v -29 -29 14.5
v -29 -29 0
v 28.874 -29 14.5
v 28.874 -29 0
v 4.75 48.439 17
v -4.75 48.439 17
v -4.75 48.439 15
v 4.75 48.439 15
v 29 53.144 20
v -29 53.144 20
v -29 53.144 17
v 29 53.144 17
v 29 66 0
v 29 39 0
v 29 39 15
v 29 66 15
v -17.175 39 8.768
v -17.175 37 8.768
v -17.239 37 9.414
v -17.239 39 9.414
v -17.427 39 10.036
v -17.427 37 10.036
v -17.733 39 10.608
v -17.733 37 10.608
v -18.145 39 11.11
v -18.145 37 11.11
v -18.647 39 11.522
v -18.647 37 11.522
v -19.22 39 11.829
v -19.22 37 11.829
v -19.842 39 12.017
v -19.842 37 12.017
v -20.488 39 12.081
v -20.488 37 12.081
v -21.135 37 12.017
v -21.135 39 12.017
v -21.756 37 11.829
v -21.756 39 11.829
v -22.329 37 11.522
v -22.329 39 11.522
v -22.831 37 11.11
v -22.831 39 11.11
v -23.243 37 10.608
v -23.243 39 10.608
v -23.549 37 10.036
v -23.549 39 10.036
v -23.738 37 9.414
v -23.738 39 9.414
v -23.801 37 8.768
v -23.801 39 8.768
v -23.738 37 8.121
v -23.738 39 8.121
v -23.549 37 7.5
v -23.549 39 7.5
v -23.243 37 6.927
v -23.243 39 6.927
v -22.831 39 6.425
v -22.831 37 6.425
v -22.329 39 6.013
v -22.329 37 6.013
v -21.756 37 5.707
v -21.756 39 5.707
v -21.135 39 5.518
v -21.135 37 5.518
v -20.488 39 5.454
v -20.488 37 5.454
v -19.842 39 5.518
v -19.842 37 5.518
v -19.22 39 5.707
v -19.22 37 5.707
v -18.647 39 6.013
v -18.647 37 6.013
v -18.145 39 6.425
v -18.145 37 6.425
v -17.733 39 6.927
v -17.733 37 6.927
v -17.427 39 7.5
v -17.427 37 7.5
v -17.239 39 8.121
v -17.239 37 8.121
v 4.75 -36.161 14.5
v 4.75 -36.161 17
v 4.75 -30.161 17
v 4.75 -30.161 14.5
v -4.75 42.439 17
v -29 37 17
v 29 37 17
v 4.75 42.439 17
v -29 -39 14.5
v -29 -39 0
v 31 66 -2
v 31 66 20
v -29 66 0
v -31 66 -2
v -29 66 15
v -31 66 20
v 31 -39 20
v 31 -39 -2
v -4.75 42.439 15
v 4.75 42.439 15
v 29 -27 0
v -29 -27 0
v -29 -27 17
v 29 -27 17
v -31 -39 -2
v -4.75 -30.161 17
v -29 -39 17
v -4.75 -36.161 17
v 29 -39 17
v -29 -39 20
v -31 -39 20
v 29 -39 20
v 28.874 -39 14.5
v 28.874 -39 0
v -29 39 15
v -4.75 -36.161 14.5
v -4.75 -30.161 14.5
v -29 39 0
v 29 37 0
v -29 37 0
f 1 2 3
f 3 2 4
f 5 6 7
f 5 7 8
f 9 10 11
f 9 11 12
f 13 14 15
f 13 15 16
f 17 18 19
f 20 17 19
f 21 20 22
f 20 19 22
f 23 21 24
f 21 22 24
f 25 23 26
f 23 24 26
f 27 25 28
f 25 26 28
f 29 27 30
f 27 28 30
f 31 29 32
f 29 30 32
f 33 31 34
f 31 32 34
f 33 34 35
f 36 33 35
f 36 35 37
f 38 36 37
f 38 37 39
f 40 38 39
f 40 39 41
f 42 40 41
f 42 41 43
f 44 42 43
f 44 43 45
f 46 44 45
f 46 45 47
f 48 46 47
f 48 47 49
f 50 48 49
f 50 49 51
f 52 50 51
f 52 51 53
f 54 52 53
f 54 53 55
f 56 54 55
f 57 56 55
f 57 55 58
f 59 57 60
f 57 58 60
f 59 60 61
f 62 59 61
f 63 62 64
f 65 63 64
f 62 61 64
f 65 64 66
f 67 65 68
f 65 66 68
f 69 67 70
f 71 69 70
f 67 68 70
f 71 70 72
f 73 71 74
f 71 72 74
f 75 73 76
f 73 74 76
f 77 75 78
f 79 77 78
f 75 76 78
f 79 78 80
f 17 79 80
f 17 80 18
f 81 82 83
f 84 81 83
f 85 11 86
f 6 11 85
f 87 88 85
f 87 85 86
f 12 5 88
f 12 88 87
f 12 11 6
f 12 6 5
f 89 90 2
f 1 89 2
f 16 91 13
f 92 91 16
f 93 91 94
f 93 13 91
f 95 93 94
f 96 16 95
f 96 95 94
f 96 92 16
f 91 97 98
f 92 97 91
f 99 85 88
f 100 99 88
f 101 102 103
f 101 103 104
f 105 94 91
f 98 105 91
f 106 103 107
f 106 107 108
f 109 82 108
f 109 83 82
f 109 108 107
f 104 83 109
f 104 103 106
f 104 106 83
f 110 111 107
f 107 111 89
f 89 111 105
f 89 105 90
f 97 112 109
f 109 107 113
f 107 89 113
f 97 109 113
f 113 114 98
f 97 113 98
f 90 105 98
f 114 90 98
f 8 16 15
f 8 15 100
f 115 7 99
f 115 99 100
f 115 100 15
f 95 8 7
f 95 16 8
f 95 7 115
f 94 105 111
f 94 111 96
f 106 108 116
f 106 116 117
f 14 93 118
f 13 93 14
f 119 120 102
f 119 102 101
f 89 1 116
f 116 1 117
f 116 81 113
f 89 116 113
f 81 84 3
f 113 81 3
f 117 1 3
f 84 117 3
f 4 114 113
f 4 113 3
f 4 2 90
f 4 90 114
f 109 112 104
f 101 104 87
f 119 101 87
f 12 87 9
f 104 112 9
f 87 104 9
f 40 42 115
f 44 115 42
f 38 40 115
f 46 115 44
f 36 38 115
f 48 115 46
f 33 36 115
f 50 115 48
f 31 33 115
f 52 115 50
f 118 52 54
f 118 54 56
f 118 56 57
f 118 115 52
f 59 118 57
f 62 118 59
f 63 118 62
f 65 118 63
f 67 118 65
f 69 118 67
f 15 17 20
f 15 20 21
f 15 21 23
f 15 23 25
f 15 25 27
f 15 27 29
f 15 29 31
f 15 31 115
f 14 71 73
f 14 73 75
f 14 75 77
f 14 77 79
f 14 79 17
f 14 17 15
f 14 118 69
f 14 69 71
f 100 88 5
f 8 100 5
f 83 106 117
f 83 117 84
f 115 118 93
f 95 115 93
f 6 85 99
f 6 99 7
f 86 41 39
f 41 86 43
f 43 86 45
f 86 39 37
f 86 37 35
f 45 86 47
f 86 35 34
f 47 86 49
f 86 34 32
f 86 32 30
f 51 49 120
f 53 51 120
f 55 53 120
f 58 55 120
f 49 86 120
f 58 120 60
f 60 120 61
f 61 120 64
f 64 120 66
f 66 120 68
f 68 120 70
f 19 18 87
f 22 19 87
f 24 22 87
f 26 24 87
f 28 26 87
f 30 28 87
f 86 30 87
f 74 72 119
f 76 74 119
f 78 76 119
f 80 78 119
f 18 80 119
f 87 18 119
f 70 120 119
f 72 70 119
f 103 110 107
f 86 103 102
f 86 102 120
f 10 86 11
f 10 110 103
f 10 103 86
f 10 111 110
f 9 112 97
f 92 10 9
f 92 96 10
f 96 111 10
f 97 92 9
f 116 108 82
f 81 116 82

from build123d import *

# Parameters (mm, degrees)
SKETCH1_W           = 62
SKETCH1_H           = 78
BOSS_EXTRUDE1_DEPTH = 2
SKETCH2_W           = 62
SKETCH2_H           = 78
SKETCH2_W_2         = 58
SKETCH2_H_2         = 64
BOSS_EXTRUDE2_DEPTH = 20
CUT_EXTRUDE1_REACH  = 86.481
SKETCH3_R           = 3.313142946
SKETCH4_W           = 62
SKETCH4_H           = 27
BOSS_EXTRUDE3_DEPTH = 2
SKETCH5_W           = 2
SKETCH5_H           = 27
BOSS_EXTRUDE4_DEPTH = 20
SKETCH6_W           = 58
SKETCH6_H           = 27
BOSS_EXTRUDE5_DEPTH = 2
SKETCH9_W           = 57.873853322
SKETCH9_H           = 10
CUT_EXTRUDE4_DEPTH  = 14.5
SKETCH12_W          = 58
SKETCH12_H          = 27
BOSS_EXTRUDE6_DEPTH = 3
SKETCH13_W          = 58
SKETCH13_H          = 92.14389058
CUT_EXTRUDE6_DEPTH  = 3
CUT_EXTRUDE7_REACH  = 77.353
SKETCH14_W          = 9.5
SKETCH14_H          = 6


with BuildPart() as part:
    # Sketch1 → Boss-Extrude1 (new body)
    with BuildSketch(Plane.XY):
        Rectangle(SKETCH1_W, SKETCH1_H)
    extrude(amount=-BOSS_EXTRUDE1_DEPTH)

    # Sketch2 → Boss-Extrude2 (add)
    with BuildSketch(Plane.XY):
        Rectangle(SKETCH2_W, SKETCH2_H)
        with Locations((0, 5)):
            Rectangle(SKETCH2_W_2, SKETCH2_H_2, mode=Mode.SUBTRACT)
    extrude(amount=BOSS_EXTRUDE2_DEPTH)

    # Sketch3 → Cut-Extrude1 (cut, up to next)
    with BuildSketch(Plane.XZ.offset(-37), mode=Mode.PRIVATE) as cut_extrude1_sk1:
        with Locations((-20.488158498, 8.767623766)):
            Circle(SKETCH3_R)
    cut_extrude1_tool1 = extrude(cut_extrude1_sk1.sketch, amount=-CUT_EXTRUDE1_REACH, mode=Mode.PRIVATE) & part.part
    add(cut_extrude1_tool1.solids().sort_by_distance((-20.488158, 37, 8.767624))[0], mode=Mode.SUBTRACT)

    # Sketch4 → Boss-Extrude3 (add)
    with BuildSketch(Plane.XY):
        with Locations((0, 52.5)):
            Rectangle(SKETCH4_W, SKETCH4_H)
    extrude(amount=-BOSS_EXTRUDE3_DEPTH)

    # Sketch5 → Boss-Extrude4 (add)
    with BuildSketch(Plane.XY):
        with Locations((-30, 52.5)):
            Rectangle(SKETCH5_W, SKETCH5_H)
        with Locations((30, 52.5)):
            Rectangle(SKETCH5_W, SKETCH5_H)
    extrude(amount=BOSS_EXTRUDE4_DEPTH)

    # Sketch6 → Boss-Extrude5 (add)
    with BuildSketch(Plane.XY.offset(20)):
        with Locations((0, 52.5)):
            Rectangle(SKETCH6_W, SKETCH6_H)
    extrude(amount=-BOSS_EXTRUDE5_DEPTH)

    # Sketch9 → Cut-Extrude4 (cut)
    with BuildSketch(Plane.XY):
        with Locations((-0.063073339, -34)):
            Rectangle(SKETCH9_W, SKETCH9_H)
    extrude(amount=CUT_EXTRUDE4_DEPTH, mode=Mode.SUBTRACT)

    # Sketch12 → Boss-Extrude6 (add)
    with BuildSketch(Plane(origin=(0, 0, 18), x_dir=(-1, 0, 0), z_dir=(0, 0, -1))):
        with Locations((0, 52.5)):
            Rectangle(SKETCH12_W, SKETCH12_H)
    extrude(amount=BOSS_EXTRUDE6_DEPTH)

    # Sketch13 → Cut-Extrude6 (cut)
    with BuildSketch(Plane.XY.offset(20)):
        with Locations((0, 7.07194529)):
            Rectangle(SKETCH13_W, SKETCH13_H)
    extrude(amount=-CUT_EXTRUDE6_DEPTH, mode=Mode.SUBTRACT)

    # Cut-Extrude7: up to this face of the body (flat: up to its plane)
    cut_extrude7_end = Plane(part.part.faces().sort_by_distance((-0.063073339, -34, 0))[0])
    # Sketch14 → Cut-Extrude7 (cut, up to the picked face)
    with BuildSketch(Plane.XY.offset(17), mode=Mode.PRIVATE) as cut_extrude7_sk1:
        with Locations((0, 45.439187808)):
            Rectangle(SKETCH14_W, SKETCH14_H)
    cut_extrude7_tool1 = split(extrude(cut_extrude7_sk1.sketch, amount=-CUT_EXTRUDE7_REACH, mode=Mode.PRIVATE), bisect_by=cut_extrude7_end, keep=Keep.BOTH, mode=Mode.PRIVATE)
    # Sketch14 → Cut-Extrude7 (cut, up to the picked face)
    with BuildSketch(Plane.XY.offset(17), mode=Mode.PRIVATE) as cut_extrude7_sk2:
        with Locations((0, -33.160812192)):
            Rectangle(SKETCH14_W, SKETCH14_H)
    cut_extrude7_tool2 = split(extrude(cut_extrude7_sk2.sketch, amount=-CUT_EXTRUDE7_REACH, mode=Mode.PRIVATE), bisect_by=cut_extrude7_end, keep=Keep.BOTH, mode=Mode.PRIVATE)
    add(cut_extrude7_tool1.solids().sort_by(Axis((0, 45.439188, 17), (0, 0, -1)))[0], mode=Mode.SUBTRACT)
    add(cut_extrude7_tool2.solids().sort_by(Axis((0, -33.160812, 17), (0, 0, -1)))[0], mode=Mode.SUBTRACT)


solid = part.part
